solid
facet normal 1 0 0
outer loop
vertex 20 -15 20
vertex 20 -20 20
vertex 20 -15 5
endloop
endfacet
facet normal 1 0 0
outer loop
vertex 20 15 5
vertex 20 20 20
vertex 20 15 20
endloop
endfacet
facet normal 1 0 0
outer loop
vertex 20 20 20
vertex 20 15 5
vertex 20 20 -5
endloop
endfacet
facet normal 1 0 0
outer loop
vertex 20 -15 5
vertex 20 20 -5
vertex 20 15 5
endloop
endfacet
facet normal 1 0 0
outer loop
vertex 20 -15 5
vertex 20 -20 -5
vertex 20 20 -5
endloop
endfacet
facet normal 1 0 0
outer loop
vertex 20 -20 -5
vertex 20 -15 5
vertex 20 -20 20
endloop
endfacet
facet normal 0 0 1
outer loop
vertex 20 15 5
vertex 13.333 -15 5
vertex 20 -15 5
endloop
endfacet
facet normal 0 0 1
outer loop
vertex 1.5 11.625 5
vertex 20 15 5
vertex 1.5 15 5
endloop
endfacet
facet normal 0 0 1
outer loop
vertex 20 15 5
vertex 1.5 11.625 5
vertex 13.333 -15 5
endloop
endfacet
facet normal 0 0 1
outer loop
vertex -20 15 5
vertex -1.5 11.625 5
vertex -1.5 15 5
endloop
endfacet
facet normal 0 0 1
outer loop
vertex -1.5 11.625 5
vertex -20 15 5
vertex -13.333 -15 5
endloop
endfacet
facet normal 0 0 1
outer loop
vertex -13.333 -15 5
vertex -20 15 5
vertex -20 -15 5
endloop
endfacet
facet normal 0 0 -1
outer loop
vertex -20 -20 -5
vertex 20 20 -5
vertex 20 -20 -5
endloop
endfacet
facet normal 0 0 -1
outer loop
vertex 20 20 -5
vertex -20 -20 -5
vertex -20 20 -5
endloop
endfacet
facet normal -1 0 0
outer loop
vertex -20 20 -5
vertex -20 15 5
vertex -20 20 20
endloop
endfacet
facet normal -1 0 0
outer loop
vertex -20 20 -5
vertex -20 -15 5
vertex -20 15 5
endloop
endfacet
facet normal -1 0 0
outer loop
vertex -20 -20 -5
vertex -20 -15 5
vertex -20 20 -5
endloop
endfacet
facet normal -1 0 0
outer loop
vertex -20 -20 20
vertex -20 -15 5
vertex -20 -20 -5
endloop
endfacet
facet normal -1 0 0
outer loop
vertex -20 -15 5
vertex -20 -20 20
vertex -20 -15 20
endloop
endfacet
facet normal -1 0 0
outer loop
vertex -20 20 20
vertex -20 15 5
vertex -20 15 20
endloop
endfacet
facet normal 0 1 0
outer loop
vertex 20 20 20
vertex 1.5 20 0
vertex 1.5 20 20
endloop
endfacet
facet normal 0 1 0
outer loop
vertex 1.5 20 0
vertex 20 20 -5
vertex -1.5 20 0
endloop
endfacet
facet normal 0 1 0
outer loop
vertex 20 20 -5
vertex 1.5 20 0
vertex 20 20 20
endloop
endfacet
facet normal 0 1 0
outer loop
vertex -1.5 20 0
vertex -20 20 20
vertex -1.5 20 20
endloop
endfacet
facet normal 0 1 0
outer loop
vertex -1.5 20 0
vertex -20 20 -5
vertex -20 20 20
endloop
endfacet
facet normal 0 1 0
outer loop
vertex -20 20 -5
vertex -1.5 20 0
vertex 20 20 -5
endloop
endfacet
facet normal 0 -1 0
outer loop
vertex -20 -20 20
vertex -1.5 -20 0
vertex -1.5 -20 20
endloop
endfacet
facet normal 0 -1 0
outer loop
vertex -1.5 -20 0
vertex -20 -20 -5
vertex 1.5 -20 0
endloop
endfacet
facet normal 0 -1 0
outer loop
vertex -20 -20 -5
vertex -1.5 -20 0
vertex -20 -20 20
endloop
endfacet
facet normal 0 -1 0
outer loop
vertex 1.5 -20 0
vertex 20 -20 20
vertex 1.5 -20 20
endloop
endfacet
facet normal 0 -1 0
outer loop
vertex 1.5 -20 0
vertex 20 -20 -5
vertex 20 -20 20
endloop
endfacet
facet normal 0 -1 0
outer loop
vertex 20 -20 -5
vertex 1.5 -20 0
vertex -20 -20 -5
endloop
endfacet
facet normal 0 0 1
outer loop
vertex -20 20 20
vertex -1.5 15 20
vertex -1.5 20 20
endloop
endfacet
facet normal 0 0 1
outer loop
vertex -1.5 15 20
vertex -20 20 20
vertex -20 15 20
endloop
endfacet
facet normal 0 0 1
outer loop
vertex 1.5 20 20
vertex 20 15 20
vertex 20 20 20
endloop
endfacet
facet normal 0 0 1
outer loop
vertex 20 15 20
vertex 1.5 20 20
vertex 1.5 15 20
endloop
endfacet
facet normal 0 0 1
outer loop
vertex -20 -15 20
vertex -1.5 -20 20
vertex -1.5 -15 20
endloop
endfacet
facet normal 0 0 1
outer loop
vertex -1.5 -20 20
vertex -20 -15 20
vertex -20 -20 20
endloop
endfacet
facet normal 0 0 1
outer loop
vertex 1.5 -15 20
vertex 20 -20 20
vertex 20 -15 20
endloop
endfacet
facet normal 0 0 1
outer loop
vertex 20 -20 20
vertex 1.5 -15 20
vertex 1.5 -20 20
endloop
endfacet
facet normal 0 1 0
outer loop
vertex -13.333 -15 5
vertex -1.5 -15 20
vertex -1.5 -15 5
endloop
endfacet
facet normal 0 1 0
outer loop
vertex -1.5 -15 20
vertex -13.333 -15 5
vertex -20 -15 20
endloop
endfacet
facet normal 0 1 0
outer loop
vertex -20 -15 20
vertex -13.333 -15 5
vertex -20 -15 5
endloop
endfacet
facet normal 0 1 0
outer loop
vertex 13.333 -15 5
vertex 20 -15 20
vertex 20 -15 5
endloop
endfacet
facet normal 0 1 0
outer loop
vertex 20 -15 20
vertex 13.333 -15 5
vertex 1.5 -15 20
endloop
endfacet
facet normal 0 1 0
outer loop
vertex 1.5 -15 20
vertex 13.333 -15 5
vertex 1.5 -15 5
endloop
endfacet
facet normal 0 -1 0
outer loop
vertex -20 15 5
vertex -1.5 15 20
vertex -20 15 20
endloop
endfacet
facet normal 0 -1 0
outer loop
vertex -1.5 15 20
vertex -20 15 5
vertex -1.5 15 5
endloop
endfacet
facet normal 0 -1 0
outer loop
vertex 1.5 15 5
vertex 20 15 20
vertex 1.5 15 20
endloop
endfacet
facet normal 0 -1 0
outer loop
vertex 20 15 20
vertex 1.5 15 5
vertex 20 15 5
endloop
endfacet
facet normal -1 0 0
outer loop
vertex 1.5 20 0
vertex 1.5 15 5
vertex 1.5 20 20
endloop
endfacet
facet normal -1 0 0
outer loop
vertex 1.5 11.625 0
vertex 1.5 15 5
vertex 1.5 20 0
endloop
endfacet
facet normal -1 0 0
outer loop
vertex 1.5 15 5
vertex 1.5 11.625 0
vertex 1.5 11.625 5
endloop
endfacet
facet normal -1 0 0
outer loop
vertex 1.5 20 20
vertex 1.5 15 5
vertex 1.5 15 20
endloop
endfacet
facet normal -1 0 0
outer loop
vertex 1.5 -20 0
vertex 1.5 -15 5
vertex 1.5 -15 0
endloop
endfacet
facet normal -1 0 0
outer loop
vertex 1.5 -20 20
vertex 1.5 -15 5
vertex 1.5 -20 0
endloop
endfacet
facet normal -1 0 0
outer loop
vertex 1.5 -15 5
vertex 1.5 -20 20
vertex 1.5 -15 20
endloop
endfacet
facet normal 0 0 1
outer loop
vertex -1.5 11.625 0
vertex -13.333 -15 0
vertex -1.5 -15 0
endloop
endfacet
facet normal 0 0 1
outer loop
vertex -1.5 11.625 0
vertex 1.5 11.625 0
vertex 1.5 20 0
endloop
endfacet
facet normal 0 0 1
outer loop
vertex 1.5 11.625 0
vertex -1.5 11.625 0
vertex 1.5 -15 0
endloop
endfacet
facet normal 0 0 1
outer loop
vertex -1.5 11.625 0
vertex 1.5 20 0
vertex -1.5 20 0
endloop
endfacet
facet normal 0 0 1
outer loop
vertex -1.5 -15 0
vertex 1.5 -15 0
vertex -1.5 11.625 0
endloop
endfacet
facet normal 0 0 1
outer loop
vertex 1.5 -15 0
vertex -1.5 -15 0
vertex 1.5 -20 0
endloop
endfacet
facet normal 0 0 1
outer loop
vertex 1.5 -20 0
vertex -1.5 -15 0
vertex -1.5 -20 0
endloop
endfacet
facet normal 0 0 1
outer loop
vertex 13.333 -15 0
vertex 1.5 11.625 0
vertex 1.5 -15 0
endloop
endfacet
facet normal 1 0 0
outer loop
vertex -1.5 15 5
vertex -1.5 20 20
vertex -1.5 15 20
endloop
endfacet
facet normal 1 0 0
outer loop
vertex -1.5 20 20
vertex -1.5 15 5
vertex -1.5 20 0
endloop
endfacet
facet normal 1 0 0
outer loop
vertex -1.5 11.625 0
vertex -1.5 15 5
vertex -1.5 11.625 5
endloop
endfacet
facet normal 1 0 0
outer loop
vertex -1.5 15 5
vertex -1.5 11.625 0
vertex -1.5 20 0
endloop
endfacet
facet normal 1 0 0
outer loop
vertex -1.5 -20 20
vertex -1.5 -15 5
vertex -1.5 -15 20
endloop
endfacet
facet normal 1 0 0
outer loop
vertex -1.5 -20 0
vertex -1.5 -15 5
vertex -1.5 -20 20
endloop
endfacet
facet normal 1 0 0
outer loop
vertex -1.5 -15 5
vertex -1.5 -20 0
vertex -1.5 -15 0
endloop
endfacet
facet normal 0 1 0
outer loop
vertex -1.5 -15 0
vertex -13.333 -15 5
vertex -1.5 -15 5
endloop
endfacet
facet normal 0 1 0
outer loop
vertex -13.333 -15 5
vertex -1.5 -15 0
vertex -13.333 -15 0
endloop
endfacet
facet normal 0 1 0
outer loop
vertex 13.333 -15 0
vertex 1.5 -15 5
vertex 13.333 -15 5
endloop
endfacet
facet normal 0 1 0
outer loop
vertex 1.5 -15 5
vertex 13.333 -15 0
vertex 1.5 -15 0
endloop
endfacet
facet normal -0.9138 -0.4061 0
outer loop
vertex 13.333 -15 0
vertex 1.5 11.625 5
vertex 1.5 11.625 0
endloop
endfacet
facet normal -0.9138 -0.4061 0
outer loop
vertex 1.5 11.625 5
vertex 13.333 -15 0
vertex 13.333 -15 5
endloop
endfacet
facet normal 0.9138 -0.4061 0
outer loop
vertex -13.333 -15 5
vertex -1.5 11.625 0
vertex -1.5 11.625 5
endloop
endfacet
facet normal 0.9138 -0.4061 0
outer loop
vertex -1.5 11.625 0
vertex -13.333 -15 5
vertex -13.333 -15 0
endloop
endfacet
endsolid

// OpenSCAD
$fa = 1;
$fs = 0.15;

w = 40;
d = 40;
h = 10;

wall_d = 5;
wall_h = 15;

module splitter(blade_w) {
  difference() {
    union() {
      cube([w, d, h], center = true);
      
      color("red")
      translate([0, -(d - wall_d)/2, (wall_h+h) / 2])
      cube([w, wall_d, wall_h], center = true);

      color("green")
      translate([0, (d - wall_d)/2, (wall_h+h) / 2])
      cube([w, wall_d, wall_h], center = true);
    };
    
    translate([0, 0, (wall_h+h/2)/2])
    cube([blade_w, d, wall_h+h/2], center = true);
    
    translate([0, 0, h/4])
    linear_extrude(h/2, center = true) {
      polygon([
        [0, d/2 - wall_d],
        [-w/3, -(d/2 - wall_d)],
        [w/3, -(d/2 - wall_d)]
      ]);
    };
  };
};

splitter(3);
